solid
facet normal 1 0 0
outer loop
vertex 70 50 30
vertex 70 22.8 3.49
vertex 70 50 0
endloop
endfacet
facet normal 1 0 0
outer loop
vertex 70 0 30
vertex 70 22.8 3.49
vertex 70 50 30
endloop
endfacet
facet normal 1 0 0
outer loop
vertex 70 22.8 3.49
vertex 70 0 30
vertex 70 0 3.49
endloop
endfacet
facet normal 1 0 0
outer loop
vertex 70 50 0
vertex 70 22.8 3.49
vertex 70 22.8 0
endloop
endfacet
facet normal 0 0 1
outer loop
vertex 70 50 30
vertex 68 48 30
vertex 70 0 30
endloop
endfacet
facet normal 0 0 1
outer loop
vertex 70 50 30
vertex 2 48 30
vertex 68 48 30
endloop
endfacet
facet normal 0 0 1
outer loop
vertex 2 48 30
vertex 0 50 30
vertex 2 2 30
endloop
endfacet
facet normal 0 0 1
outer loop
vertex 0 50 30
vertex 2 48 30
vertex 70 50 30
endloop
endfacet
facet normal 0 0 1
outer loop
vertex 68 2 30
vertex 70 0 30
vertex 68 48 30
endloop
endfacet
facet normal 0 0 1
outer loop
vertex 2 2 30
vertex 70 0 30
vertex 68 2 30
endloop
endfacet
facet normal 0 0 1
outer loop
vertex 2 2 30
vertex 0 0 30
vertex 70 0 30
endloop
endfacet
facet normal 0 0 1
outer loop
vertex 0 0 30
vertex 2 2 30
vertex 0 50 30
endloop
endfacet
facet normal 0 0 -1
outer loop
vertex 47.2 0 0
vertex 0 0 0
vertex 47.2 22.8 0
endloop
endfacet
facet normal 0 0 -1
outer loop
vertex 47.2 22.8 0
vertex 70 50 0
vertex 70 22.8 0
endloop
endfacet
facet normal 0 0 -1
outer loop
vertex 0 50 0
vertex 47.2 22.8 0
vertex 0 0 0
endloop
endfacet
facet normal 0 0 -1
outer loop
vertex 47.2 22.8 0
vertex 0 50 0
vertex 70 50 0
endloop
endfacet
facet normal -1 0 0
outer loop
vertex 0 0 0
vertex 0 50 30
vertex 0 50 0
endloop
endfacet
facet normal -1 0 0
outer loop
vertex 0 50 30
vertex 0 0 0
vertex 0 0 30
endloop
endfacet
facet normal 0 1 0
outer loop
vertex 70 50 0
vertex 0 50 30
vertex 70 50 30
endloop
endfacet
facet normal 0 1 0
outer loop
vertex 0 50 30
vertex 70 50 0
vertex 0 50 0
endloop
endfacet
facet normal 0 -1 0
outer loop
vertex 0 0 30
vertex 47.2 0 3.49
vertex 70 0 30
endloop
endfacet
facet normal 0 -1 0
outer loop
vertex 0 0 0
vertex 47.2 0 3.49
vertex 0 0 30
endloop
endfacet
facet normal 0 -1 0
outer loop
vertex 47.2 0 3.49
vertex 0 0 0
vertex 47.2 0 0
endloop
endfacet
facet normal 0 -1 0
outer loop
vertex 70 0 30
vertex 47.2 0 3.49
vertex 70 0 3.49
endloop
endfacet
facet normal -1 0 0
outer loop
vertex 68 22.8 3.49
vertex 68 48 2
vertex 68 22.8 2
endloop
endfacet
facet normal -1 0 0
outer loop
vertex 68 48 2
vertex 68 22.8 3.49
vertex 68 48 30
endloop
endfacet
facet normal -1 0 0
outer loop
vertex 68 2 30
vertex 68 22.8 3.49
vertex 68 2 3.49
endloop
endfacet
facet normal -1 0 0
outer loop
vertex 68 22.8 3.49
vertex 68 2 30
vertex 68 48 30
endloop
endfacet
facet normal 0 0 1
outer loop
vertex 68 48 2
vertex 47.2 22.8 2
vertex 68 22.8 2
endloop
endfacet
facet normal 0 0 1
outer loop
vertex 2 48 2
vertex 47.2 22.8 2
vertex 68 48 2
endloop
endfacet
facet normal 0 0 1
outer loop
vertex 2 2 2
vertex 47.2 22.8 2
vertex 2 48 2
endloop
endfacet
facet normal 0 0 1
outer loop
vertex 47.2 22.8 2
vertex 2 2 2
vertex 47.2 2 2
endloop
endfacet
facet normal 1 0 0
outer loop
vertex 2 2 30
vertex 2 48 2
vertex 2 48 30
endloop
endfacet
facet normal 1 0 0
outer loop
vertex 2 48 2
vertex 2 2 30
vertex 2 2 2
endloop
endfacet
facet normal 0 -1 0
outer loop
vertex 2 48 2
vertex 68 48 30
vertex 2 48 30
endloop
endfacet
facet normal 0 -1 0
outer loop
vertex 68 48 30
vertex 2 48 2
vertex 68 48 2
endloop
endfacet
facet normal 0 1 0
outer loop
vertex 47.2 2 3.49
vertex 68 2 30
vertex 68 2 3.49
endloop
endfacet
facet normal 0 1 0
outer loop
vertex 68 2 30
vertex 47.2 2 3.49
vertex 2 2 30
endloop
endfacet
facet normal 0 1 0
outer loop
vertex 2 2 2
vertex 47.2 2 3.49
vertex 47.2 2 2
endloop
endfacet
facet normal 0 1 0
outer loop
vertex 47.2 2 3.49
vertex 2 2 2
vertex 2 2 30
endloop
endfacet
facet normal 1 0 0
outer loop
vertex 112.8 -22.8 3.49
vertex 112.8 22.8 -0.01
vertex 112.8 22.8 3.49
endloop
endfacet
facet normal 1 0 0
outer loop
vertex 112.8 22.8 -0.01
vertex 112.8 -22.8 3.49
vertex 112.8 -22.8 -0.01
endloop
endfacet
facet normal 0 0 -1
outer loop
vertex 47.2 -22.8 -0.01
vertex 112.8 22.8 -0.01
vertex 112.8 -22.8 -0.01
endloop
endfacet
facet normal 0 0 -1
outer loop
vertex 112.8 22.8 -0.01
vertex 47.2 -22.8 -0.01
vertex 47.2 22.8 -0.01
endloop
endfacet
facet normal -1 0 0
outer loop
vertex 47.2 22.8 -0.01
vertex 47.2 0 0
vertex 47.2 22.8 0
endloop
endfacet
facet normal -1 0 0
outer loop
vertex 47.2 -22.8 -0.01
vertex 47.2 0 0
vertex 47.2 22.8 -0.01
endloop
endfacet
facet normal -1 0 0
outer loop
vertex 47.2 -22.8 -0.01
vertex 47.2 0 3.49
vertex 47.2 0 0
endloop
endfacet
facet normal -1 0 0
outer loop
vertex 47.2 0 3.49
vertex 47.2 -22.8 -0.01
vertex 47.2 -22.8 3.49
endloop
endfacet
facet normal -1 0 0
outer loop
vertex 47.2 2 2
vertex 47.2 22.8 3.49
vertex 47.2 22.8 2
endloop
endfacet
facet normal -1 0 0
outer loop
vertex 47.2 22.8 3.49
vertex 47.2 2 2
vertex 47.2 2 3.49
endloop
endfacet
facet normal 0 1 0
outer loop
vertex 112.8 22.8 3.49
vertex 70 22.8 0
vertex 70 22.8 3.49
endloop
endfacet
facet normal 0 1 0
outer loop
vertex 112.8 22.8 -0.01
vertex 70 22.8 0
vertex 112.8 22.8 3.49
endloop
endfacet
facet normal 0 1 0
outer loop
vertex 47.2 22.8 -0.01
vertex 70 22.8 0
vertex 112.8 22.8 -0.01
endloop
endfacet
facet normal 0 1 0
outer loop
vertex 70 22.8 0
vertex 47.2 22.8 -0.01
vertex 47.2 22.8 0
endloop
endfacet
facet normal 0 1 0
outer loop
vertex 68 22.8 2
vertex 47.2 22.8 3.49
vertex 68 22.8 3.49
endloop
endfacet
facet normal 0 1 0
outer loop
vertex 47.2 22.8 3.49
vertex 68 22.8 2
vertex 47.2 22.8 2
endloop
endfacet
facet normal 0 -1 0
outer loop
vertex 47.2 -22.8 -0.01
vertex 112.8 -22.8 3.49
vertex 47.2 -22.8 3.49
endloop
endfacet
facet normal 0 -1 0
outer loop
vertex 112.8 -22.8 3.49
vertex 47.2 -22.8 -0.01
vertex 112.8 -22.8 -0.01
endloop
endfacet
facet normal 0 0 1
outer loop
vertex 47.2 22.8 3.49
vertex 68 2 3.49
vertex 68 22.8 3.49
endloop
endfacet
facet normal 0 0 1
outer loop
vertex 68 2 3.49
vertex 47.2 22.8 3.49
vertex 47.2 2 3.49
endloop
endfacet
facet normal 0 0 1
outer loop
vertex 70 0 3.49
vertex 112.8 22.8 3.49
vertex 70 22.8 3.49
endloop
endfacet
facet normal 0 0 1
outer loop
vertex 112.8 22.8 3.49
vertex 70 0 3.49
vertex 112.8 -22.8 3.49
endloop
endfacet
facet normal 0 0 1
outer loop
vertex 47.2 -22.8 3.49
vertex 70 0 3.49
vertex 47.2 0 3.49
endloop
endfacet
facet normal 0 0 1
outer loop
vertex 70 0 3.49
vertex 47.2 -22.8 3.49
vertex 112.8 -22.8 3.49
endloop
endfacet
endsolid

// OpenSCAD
// Two-part enclosure for small electronics board (e.g. Arduino-based temp logger)
// Print orientation: box standing on the bed, lid on top (overlapping slightly)

$fn = 64;

// ---- Box ----
box_x = 70;    // outer size in X
box_y = 50;    // outer size in Y
box_z = 30;    // outer size in Z
wall  = 2;     // wall thickness (sides and floor)

// ---- Lid ----
lip_x   = 65.6;          // outer size of lip in X
lip_y   = 45.6;          // outer size of lip in Y
lip_w   = 1.5;           // lip wall thickness
lip_h   = 4;             // lip height (from plate top)
plate_t = 2;             // plate thickness
head    = box_x + 10;    // lid starts this far in +X from box

// ---- Derived ----
floor_t  = wall;         // floor thickness (2 mm)
lip_overt = lip_h + wall; // lip top is this far above floor (6 mm)
eps      = 0.01;         // small overlap to avoid coplanar faces

module box() {
    difference() {
        cube([box_x, box_y, box_z]);
        // open-top cavity
        translate([wall, wall, floor_t])
            cube([box_x - 2*wall, box_y - 2*wall, box_z - floor_t + eps]);
    }
}

module lid() {
    union() {
        // base plate
        translate([head - lip_x/2, -lip_y/2, 0])
            cube([lip_x, lip_y, plate_t]);
        // rectangular lip on top
        translate([head - lip_x/2, -lip_y/2, plate_t])
            cube([lip_x, lip_y, lip_w]);
    }
}

union() {
    box();
    translate([0, 0, -eps]) lid();
}
